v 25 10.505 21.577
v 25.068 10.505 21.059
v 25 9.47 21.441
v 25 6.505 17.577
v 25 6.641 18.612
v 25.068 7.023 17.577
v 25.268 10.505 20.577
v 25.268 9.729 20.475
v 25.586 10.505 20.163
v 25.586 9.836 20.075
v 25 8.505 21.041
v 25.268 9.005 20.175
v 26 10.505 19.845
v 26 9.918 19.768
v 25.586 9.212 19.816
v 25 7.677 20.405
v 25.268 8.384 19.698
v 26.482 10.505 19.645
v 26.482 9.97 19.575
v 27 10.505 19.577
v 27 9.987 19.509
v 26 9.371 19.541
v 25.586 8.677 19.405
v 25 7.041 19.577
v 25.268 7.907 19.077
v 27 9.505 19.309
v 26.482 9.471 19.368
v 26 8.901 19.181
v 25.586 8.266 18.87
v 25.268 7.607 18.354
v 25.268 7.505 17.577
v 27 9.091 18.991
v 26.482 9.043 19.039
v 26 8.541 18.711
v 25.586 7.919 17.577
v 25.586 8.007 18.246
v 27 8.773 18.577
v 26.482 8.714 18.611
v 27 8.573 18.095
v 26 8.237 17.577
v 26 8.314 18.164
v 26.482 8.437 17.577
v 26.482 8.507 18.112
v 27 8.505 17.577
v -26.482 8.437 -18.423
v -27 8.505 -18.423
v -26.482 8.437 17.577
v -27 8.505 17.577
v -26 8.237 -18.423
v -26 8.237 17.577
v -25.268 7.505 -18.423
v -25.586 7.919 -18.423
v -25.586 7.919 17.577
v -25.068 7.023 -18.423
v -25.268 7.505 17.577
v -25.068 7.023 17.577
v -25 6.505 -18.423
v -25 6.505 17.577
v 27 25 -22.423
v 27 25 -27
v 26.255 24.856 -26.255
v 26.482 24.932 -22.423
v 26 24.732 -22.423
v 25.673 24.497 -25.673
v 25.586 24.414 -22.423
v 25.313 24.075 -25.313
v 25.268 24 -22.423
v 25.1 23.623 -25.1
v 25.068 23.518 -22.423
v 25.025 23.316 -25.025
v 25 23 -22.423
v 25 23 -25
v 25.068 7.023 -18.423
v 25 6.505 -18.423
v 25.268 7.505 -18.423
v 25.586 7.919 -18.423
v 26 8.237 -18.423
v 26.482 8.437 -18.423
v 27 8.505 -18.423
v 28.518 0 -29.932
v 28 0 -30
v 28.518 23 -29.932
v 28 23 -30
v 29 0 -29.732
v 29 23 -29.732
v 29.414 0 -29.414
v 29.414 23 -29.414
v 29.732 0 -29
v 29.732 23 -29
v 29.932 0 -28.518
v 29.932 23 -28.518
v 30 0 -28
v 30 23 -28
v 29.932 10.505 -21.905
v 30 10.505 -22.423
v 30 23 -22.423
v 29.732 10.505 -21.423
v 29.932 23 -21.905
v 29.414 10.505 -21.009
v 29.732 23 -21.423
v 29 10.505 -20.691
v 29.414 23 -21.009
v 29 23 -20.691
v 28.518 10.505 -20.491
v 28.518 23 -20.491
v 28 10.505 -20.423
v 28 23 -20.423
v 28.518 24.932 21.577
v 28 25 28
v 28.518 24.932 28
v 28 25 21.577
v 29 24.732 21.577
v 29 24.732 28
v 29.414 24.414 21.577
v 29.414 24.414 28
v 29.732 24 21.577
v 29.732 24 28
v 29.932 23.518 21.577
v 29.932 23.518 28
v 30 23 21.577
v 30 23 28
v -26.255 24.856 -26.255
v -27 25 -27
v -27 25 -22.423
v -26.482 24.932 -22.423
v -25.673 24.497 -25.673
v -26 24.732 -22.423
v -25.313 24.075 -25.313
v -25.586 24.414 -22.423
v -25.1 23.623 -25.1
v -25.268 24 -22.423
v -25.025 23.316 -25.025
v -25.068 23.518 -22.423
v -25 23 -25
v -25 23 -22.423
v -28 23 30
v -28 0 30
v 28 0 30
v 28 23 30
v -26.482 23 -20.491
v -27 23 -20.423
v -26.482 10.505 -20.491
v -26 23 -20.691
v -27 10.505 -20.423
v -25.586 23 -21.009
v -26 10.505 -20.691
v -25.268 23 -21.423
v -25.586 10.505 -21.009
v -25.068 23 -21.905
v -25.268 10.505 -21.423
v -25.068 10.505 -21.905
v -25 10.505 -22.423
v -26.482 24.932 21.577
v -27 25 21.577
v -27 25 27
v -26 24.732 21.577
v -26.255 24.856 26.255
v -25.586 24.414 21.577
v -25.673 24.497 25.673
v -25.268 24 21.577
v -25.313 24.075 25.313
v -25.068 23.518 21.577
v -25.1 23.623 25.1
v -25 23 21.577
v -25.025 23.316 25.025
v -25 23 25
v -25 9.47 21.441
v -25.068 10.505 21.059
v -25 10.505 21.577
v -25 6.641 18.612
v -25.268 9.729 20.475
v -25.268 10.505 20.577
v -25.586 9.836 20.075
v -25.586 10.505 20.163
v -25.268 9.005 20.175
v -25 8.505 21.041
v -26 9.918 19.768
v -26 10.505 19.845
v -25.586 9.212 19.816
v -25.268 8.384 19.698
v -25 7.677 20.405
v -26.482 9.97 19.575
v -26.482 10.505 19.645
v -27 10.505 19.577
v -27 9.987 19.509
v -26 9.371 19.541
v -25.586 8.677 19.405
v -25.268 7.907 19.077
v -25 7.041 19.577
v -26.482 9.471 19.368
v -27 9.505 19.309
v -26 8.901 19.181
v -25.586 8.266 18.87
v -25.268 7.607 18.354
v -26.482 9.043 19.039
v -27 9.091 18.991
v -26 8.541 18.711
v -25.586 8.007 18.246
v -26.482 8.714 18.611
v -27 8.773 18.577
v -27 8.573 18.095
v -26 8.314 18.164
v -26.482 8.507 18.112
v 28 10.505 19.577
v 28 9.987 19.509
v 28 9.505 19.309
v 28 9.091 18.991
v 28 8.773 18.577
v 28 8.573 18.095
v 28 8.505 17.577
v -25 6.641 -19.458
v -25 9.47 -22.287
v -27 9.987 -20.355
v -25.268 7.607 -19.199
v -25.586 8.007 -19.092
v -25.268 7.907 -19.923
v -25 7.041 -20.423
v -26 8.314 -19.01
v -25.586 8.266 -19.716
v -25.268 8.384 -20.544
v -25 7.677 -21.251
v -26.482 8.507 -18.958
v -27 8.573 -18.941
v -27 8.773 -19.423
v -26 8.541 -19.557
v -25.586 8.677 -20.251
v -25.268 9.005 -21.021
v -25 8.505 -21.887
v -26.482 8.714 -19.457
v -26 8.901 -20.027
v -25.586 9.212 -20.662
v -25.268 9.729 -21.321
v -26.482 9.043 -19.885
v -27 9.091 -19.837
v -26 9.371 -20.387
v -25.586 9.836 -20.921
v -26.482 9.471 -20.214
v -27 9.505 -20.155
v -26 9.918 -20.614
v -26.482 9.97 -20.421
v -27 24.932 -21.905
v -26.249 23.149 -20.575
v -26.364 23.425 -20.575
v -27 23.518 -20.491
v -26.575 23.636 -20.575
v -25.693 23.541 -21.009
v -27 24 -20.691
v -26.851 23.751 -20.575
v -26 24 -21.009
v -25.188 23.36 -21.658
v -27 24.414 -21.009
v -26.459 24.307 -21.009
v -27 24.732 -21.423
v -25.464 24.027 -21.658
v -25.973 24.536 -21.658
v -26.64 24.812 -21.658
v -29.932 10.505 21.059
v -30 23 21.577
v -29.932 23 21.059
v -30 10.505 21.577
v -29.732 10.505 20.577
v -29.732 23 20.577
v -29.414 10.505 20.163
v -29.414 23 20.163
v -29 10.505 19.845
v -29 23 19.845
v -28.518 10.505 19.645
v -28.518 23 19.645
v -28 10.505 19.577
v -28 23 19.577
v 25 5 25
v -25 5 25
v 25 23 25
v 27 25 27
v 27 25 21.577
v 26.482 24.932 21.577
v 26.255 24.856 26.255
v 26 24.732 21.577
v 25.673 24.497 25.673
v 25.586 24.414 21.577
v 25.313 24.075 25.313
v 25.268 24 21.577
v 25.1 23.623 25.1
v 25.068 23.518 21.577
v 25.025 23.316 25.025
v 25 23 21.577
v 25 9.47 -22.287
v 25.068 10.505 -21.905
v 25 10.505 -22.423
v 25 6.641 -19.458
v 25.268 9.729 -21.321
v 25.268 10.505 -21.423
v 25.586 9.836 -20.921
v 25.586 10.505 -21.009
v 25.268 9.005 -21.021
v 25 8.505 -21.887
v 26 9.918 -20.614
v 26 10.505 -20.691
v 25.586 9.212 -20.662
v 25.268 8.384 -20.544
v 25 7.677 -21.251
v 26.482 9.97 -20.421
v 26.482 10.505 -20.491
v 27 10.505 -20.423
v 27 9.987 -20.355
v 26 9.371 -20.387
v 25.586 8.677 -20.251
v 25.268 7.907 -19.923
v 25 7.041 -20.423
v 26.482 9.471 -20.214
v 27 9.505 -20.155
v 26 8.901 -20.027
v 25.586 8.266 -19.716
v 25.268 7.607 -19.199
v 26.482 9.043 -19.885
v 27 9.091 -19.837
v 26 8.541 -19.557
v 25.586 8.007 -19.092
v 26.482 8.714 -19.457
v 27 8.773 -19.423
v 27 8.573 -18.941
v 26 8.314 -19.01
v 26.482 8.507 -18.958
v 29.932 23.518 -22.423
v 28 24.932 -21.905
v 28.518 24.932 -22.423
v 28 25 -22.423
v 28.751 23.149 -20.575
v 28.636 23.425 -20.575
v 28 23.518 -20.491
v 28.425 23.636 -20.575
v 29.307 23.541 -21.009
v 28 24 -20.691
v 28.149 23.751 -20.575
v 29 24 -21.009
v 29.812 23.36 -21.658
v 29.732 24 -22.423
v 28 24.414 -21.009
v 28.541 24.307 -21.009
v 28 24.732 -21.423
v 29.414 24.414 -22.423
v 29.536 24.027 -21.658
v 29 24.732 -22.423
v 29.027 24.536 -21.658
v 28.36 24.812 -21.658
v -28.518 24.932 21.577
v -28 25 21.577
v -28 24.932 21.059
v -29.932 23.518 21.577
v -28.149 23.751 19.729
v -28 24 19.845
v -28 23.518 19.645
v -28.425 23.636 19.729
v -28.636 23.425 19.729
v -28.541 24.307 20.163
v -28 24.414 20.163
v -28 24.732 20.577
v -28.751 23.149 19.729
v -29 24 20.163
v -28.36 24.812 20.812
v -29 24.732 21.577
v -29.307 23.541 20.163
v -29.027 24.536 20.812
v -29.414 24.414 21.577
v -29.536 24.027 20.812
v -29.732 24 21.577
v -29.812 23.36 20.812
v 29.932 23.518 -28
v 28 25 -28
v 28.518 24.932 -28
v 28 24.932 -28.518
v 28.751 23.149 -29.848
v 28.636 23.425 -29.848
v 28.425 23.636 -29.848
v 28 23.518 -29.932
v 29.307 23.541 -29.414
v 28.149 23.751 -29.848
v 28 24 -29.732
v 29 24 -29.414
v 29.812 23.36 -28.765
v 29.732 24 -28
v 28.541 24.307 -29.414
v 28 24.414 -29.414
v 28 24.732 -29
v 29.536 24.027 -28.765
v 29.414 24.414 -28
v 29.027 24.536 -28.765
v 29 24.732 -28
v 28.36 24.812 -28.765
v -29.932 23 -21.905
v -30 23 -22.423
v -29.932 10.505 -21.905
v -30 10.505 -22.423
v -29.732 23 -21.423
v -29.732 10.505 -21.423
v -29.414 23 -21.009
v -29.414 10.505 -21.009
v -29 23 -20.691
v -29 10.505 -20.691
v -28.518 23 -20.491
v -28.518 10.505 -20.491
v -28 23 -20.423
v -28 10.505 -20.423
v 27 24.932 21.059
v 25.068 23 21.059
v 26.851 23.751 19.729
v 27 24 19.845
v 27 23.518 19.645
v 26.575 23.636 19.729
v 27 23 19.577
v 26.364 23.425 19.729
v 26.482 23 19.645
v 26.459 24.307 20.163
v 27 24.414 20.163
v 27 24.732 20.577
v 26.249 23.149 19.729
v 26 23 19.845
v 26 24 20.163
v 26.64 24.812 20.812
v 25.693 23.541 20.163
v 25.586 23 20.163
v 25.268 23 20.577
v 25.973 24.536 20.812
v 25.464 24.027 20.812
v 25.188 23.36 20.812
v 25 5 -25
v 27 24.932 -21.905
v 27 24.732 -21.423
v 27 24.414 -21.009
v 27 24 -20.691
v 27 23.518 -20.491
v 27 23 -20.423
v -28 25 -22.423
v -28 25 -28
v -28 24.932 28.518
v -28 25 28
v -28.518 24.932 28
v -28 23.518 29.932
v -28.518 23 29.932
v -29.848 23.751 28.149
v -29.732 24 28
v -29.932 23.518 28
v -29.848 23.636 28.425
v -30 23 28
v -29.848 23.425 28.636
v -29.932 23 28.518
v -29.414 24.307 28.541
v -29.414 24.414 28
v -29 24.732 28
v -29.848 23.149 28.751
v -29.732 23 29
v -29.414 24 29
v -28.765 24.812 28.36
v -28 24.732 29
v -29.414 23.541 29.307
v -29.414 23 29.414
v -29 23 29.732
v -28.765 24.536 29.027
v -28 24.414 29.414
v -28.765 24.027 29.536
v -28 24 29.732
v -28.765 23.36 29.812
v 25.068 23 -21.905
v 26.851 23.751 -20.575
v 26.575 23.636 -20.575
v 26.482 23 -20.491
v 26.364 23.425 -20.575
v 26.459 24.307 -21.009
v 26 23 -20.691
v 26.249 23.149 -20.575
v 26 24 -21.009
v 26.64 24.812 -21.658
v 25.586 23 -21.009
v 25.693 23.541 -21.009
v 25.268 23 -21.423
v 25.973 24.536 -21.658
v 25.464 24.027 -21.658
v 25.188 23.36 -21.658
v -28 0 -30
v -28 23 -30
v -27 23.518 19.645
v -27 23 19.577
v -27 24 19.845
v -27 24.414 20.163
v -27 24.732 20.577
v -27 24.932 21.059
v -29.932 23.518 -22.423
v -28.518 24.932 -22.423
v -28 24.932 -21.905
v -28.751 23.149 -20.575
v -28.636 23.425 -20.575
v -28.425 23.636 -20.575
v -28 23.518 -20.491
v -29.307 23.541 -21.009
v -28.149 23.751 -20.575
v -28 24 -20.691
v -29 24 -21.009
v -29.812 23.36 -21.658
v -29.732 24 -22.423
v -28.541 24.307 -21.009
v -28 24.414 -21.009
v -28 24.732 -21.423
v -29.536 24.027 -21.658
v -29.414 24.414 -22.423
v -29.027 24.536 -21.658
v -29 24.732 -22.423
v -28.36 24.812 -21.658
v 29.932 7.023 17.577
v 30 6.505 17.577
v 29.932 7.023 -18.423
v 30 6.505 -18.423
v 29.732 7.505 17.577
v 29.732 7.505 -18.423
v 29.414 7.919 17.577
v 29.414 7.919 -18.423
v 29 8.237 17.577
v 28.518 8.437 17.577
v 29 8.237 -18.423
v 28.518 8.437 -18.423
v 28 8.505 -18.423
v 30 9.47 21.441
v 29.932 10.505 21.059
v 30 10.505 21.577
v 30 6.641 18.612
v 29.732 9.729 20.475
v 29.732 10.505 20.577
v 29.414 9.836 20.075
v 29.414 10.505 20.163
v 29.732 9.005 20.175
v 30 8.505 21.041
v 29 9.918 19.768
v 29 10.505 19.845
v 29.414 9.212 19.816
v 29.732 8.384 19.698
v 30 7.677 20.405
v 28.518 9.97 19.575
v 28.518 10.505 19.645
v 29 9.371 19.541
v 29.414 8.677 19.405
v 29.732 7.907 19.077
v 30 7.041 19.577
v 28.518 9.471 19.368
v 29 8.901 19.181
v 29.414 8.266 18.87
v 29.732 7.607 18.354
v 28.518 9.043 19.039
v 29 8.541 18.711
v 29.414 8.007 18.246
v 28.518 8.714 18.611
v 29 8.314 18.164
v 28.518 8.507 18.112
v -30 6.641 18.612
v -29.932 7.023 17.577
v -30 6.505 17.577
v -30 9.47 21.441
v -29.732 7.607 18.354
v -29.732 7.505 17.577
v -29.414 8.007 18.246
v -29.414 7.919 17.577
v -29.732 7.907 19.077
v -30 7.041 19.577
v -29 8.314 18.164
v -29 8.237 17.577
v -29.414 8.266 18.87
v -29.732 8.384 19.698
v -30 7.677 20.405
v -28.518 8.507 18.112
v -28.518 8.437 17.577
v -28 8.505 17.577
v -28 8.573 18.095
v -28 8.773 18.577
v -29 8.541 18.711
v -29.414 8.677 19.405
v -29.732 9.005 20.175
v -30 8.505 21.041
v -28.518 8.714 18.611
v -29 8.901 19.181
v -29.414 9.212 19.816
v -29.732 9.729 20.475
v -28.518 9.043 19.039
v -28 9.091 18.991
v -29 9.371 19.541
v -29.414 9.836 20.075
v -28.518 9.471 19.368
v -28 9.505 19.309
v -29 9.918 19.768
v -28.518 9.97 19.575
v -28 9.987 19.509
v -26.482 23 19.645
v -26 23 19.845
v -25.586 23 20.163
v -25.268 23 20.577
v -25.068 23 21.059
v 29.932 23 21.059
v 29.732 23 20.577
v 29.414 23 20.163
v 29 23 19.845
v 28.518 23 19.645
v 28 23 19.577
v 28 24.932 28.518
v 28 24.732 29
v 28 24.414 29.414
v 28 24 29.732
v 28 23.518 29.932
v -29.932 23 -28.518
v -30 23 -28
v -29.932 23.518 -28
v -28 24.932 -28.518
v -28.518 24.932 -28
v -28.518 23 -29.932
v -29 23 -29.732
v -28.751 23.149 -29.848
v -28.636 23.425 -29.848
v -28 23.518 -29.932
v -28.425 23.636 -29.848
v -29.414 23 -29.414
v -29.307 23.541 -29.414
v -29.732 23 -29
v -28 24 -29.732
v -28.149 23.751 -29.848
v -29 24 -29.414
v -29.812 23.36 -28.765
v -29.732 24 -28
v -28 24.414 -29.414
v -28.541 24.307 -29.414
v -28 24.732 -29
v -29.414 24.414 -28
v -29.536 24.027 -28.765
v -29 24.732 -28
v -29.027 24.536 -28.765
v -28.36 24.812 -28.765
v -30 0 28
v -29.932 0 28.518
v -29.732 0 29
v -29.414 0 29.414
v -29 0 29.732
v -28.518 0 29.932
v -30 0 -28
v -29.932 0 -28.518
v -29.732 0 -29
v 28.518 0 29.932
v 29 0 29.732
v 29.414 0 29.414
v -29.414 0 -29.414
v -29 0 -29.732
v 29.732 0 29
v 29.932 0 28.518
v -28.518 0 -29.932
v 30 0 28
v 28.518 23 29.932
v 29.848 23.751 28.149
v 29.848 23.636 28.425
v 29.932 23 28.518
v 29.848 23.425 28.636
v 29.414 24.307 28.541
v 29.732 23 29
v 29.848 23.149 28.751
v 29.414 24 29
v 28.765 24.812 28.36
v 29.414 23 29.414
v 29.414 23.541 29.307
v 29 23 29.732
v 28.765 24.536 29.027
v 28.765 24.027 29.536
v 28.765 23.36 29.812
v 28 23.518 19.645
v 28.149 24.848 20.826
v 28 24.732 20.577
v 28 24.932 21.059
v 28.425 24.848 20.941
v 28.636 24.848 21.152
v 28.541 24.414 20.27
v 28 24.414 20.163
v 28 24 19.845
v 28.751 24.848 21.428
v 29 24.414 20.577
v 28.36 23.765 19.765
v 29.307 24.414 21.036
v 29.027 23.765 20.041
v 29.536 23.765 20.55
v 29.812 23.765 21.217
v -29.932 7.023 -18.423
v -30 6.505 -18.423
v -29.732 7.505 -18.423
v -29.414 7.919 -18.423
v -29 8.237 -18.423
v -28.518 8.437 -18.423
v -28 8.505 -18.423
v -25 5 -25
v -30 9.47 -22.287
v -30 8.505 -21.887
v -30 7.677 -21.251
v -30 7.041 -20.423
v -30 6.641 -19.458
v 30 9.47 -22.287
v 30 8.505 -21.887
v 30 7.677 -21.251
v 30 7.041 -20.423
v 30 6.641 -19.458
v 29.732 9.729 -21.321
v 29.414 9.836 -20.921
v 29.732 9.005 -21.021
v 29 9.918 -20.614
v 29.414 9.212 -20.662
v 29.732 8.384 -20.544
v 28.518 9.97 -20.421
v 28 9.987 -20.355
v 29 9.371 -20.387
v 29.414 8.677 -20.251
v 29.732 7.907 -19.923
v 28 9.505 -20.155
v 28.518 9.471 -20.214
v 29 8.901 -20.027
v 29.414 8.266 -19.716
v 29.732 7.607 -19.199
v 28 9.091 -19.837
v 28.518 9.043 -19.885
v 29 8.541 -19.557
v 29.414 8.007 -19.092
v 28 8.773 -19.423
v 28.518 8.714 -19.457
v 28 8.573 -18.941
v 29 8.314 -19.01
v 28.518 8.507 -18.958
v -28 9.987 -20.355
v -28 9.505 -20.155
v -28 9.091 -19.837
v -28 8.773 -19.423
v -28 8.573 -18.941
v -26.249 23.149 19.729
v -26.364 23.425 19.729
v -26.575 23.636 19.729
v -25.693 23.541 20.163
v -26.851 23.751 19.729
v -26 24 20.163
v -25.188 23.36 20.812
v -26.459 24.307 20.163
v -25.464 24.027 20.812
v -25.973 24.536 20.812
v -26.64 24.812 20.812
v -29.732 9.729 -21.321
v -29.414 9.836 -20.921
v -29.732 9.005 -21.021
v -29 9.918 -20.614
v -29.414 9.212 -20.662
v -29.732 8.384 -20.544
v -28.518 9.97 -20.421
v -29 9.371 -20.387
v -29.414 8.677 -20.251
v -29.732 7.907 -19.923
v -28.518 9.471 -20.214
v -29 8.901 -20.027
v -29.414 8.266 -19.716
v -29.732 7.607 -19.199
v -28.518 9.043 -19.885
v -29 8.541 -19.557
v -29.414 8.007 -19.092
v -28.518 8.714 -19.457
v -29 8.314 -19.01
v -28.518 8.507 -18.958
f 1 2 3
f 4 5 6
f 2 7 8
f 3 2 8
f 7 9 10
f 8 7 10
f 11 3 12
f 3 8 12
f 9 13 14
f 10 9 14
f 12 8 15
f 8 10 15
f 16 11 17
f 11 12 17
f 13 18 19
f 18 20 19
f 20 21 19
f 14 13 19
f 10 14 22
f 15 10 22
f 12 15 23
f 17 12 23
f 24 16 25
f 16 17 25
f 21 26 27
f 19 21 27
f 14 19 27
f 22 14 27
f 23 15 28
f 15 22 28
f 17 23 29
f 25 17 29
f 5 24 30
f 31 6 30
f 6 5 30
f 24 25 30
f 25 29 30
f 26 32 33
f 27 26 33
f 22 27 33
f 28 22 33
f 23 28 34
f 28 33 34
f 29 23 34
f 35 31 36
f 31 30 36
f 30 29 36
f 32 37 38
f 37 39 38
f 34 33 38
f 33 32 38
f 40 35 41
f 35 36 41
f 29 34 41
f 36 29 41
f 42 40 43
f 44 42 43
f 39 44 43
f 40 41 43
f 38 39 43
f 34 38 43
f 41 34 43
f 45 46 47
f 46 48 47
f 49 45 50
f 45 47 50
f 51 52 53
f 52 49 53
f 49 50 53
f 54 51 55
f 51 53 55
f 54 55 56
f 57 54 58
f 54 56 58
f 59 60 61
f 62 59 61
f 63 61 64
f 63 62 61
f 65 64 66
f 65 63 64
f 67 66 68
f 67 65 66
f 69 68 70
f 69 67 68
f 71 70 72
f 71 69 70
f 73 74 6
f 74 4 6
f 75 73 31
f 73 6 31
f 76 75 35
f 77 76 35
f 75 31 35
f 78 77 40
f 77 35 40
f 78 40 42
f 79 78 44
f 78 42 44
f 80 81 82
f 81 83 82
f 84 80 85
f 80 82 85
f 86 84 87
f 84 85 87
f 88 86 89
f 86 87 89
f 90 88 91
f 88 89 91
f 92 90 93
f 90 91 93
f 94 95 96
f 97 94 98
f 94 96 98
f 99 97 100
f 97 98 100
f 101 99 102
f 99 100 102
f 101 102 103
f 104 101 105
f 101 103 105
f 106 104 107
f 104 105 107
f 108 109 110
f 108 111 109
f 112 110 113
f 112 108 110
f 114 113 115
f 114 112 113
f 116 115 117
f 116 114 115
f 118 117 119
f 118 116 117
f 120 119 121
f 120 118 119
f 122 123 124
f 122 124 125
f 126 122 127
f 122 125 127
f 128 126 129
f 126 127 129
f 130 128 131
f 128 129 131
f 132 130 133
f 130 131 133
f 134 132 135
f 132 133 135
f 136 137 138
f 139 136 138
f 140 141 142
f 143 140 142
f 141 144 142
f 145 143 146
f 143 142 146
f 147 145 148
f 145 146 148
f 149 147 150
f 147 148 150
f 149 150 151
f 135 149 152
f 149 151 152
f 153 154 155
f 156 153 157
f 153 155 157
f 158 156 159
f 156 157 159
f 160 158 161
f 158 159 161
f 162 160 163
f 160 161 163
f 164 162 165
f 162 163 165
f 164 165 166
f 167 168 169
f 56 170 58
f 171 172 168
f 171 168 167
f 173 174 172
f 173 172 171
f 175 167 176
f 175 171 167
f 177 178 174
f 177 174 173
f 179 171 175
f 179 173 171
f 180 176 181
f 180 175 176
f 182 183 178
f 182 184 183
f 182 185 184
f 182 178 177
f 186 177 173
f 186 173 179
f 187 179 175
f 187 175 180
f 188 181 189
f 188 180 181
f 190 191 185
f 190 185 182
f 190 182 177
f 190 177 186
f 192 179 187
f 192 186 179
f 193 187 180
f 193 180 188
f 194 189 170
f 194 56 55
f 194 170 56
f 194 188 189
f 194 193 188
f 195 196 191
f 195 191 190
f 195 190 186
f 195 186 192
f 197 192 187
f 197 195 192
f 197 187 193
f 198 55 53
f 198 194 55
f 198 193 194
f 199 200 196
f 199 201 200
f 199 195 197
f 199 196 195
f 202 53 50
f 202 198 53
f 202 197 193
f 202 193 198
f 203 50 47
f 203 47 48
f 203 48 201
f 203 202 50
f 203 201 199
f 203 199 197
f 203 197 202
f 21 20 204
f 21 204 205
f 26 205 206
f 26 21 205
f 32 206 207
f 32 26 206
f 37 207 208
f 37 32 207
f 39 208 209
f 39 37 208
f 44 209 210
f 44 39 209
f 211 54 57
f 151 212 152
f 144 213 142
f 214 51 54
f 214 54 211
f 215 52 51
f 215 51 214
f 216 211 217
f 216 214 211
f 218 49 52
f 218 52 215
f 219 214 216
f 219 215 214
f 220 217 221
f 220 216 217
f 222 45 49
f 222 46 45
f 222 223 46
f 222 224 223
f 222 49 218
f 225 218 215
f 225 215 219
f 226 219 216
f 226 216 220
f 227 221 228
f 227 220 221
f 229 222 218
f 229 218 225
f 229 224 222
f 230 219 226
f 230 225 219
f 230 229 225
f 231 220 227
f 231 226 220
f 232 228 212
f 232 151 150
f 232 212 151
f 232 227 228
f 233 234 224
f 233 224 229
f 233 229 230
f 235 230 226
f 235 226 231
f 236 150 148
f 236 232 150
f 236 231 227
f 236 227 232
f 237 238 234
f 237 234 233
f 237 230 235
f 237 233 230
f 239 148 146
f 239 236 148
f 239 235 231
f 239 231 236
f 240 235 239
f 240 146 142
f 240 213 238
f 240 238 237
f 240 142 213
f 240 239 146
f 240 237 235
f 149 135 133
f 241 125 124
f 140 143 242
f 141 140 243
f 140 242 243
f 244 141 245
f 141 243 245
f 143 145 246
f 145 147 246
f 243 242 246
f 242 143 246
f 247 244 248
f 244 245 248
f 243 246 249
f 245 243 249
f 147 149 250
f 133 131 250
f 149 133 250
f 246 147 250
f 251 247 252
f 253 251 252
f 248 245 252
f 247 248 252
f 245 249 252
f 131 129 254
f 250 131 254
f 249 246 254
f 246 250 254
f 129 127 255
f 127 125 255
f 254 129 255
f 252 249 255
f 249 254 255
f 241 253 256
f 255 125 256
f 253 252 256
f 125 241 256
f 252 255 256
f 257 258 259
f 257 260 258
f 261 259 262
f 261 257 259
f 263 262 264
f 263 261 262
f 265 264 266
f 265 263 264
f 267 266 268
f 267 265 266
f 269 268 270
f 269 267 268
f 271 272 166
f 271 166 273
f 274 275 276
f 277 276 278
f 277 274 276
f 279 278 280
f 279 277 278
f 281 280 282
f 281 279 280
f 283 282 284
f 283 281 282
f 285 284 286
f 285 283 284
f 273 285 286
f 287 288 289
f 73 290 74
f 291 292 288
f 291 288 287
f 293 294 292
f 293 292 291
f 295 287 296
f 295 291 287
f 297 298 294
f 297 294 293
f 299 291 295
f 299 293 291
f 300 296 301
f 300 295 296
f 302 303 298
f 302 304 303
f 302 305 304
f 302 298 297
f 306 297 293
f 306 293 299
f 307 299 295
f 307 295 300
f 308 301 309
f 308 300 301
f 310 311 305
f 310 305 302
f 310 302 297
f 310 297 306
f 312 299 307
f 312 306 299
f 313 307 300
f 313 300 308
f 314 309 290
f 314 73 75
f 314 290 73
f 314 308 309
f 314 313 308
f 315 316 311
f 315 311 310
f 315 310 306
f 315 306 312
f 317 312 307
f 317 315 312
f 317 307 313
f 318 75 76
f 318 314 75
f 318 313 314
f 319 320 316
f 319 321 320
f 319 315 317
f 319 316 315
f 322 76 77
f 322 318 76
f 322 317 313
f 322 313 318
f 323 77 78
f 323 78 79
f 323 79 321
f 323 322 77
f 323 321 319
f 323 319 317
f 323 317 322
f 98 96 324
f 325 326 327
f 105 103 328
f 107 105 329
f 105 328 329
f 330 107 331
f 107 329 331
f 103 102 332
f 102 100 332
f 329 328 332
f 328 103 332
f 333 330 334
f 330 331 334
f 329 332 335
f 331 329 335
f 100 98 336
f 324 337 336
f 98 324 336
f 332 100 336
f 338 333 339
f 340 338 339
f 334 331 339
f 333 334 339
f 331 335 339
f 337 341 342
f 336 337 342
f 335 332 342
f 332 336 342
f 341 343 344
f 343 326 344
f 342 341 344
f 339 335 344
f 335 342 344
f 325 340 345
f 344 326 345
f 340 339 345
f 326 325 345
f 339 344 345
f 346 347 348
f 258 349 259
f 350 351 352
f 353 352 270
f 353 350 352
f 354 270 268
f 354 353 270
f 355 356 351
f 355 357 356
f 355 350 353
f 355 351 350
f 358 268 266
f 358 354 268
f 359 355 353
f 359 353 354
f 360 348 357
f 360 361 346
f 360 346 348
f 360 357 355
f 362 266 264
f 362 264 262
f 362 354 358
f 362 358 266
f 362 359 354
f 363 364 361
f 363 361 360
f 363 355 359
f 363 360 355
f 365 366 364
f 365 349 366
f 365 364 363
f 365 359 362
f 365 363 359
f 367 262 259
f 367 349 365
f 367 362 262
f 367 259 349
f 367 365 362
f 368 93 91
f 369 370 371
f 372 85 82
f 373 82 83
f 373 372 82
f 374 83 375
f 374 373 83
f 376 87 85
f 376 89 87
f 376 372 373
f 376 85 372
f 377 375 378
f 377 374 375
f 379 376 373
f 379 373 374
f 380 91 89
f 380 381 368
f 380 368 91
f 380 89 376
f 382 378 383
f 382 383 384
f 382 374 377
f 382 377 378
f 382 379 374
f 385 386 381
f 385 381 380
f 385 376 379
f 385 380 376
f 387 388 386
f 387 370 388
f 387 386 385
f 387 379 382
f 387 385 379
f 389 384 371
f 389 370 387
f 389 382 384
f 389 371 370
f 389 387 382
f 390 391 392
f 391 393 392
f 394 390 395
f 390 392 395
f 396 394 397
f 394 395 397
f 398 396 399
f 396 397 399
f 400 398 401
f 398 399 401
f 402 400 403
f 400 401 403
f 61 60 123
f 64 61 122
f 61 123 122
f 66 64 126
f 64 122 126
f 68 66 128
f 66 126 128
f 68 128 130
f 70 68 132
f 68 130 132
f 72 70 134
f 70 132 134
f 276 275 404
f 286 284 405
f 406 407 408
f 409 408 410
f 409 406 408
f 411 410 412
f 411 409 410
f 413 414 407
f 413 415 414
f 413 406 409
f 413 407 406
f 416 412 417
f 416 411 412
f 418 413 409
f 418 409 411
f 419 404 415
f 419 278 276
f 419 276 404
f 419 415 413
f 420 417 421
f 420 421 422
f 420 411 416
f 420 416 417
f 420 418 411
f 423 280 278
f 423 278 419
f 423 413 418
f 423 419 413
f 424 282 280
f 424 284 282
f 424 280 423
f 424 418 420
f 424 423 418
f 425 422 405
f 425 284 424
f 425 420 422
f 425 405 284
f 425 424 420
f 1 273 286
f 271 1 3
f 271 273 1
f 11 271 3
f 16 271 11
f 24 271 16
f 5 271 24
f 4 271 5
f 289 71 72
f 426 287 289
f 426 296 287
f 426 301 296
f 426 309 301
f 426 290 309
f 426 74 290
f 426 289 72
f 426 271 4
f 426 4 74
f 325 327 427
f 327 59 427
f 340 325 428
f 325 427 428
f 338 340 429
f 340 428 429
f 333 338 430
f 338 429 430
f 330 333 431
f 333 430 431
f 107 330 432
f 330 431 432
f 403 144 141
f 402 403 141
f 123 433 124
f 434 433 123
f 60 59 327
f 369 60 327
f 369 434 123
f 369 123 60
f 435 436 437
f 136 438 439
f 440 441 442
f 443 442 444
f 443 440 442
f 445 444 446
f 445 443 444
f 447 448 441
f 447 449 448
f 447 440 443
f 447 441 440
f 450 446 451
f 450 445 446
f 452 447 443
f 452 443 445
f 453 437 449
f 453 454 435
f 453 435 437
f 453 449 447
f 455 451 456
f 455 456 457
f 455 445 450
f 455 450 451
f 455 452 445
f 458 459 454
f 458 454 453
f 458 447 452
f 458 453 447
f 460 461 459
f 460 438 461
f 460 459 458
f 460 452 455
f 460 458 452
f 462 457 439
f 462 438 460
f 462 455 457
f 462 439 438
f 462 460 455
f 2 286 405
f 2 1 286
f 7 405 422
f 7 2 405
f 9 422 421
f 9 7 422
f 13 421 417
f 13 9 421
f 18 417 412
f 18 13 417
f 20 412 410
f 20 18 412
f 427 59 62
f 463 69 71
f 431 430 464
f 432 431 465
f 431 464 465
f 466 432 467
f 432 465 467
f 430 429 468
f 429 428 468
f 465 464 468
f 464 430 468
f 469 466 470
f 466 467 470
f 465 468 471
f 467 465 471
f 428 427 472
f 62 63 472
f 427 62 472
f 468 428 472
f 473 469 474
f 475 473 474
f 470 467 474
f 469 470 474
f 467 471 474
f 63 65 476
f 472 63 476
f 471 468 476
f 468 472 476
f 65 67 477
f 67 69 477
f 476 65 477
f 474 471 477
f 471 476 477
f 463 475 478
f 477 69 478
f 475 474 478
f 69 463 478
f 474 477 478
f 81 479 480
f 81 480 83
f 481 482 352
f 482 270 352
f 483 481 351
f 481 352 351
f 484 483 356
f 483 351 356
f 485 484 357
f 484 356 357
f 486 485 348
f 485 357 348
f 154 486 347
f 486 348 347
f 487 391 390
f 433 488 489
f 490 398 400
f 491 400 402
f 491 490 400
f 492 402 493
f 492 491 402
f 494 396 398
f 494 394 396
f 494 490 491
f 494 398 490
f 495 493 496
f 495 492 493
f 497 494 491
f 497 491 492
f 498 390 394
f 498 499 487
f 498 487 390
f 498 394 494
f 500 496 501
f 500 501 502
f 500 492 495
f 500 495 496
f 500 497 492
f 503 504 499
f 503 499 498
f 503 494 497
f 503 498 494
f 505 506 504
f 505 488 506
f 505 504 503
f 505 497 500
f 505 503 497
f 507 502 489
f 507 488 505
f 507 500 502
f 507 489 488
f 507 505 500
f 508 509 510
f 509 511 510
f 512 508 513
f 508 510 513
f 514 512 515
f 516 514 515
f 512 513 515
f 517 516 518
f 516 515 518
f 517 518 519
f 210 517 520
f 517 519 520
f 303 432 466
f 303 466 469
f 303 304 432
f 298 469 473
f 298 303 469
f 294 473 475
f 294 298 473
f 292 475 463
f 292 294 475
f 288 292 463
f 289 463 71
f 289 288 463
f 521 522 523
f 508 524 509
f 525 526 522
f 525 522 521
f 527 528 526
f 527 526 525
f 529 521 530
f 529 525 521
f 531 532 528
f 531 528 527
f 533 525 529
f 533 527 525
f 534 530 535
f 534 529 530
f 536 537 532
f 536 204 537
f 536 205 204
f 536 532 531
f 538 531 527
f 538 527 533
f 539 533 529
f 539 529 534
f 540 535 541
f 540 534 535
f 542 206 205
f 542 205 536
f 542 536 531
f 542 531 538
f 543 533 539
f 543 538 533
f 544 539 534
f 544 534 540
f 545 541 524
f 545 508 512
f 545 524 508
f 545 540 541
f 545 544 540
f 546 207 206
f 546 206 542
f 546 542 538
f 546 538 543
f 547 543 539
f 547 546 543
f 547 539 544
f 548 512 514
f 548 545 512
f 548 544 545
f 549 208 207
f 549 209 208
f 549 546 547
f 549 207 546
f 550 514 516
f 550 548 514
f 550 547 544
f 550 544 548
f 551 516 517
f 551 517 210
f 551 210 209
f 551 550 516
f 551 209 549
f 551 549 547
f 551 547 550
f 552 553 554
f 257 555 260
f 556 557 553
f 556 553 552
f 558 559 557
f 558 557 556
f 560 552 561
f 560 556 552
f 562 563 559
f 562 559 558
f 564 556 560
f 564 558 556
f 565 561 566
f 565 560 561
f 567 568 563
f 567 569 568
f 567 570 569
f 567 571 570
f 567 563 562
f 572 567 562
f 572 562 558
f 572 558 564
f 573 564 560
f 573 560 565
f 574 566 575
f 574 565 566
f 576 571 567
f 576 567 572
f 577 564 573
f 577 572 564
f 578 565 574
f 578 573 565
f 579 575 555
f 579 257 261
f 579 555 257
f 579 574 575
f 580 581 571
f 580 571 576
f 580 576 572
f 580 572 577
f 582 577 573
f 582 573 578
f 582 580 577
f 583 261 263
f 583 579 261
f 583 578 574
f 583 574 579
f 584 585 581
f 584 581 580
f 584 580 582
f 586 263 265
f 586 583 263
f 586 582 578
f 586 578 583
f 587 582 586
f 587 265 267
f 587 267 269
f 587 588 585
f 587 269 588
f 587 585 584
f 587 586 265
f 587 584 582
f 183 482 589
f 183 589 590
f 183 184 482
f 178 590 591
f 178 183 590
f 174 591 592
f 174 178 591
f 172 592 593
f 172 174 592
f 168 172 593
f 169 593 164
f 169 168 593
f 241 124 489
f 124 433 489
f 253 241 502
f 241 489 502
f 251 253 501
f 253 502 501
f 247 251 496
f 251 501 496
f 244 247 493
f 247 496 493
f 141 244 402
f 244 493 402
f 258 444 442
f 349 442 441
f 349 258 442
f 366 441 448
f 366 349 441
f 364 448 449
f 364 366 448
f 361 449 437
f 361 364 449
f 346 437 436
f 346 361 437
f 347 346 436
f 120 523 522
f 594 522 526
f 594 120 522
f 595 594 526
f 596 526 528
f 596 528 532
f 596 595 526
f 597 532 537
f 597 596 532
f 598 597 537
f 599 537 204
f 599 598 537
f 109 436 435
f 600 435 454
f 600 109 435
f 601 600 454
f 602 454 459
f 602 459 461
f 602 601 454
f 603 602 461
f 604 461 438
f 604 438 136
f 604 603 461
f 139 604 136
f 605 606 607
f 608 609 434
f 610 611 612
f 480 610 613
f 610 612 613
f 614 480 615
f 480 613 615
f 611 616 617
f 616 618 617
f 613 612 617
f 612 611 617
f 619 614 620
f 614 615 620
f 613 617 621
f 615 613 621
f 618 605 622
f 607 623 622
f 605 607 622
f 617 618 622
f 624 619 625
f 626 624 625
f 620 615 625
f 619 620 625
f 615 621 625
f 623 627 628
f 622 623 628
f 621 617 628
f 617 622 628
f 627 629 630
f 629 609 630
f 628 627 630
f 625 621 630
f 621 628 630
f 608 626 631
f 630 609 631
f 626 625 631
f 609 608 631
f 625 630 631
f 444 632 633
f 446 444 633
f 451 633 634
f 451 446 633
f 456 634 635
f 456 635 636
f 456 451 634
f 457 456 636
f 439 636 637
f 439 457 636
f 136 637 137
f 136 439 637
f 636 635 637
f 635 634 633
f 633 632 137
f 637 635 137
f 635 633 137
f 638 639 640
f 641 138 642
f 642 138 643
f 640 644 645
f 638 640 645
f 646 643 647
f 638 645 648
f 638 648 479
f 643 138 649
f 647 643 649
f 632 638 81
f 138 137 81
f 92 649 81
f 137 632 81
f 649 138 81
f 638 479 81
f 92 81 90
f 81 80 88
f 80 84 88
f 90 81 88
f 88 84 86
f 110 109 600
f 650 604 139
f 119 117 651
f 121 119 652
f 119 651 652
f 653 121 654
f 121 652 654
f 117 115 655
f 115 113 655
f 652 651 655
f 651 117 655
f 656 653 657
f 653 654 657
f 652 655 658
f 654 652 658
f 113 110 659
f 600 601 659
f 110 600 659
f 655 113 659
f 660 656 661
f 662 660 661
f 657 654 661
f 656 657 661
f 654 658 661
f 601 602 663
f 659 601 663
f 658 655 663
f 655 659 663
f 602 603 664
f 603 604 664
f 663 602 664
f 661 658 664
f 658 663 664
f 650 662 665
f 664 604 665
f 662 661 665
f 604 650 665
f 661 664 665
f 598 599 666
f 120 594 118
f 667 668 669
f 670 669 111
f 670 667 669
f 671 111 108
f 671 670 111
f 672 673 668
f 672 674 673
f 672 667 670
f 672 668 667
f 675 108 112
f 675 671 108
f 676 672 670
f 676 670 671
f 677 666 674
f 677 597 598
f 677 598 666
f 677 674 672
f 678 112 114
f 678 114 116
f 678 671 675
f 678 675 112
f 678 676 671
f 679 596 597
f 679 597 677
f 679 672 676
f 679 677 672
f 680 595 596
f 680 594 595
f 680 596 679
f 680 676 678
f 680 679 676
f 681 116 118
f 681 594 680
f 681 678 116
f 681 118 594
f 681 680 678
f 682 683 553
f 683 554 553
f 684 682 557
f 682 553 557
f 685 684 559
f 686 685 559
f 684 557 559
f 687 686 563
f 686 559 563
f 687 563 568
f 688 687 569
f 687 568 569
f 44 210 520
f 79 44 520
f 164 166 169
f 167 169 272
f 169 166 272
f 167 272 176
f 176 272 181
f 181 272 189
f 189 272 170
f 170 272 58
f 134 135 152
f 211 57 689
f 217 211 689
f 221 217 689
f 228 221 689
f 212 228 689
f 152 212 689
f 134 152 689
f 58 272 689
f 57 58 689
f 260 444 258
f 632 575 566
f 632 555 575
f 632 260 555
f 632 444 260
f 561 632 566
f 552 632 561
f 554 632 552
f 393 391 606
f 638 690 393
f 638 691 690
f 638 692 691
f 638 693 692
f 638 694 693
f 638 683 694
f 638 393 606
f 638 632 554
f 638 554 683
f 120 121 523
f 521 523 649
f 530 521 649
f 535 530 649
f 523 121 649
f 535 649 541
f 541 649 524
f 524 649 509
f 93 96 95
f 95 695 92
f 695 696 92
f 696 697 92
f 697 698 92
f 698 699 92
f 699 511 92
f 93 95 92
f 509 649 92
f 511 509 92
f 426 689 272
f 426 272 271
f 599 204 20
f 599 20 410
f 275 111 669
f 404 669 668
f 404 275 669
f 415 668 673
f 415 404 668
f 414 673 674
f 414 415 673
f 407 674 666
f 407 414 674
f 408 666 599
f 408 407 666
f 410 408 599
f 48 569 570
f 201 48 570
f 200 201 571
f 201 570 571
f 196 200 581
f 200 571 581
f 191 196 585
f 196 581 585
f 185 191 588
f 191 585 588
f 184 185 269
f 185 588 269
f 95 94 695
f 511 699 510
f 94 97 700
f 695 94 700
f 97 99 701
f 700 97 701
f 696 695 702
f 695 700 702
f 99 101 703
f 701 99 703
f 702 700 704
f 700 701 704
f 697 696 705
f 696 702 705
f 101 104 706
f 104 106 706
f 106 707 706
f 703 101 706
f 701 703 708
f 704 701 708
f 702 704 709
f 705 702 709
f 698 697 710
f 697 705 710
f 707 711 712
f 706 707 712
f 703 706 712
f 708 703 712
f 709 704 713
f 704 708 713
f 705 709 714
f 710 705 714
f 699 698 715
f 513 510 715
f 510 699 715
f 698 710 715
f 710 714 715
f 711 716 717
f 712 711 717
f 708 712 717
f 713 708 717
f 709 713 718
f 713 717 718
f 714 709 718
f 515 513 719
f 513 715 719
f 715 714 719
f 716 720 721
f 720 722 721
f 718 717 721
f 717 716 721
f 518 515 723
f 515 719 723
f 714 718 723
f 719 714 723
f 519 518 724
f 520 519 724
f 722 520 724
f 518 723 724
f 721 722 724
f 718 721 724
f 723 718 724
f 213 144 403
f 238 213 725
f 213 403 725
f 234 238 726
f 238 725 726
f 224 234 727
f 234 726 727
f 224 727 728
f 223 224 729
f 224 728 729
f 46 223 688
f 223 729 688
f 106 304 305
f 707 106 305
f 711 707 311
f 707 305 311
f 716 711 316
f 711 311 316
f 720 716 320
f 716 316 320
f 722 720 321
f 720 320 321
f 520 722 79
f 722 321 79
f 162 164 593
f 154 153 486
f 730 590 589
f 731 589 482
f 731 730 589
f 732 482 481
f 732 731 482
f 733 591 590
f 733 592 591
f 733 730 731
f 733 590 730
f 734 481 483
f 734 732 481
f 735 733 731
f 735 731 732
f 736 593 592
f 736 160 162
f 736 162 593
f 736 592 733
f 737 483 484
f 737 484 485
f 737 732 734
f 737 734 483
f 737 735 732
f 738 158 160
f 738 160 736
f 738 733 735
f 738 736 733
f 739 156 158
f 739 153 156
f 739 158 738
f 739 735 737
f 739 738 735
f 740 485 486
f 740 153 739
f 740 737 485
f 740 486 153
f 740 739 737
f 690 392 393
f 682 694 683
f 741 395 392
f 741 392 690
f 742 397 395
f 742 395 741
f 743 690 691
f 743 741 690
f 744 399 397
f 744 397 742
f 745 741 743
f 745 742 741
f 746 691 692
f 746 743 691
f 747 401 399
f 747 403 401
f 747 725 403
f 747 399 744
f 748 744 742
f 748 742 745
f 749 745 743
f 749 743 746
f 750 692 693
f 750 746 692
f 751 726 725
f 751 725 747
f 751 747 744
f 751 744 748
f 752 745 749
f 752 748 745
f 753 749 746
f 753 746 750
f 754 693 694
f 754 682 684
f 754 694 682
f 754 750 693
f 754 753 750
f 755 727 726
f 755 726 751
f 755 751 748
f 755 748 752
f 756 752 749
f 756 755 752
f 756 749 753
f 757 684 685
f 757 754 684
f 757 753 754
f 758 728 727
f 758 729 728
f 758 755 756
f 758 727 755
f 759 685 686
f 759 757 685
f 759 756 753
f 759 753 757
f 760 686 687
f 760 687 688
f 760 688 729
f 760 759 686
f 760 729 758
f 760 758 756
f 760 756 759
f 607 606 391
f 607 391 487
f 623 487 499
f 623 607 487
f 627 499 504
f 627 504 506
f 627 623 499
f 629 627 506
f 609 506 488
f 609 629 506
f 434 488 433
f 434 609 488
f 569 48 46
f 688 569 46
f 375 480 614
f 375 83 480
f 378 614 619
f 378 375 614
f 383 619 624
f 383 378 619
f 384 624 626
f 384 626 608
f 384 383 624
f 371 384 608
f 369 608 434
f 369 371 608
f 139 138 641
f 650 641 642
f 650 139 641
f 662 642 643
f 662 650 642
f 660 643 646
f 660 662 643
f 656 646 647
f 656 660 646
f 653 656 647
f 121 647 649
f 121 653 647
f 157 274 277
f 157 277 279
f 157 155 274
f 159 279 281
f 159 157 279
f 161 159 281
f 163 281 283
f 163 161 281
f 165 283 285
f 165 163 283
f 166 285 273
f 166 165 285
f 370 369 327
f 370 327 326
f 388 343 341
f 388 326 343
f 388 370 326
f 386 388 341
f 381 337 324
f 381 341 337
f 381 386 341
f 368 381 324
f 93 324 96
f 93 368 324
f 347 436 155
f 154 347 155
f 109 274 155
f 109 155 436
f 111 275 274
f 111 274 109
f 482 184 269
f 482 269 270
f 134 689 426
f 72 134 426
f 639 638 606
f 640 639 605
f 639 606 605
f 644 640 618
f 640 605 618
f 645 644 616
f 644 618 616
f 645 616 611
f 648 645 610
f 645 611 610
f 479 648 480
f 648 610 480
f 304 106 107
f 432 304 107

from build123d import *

# Parameters (mm, degrees)
SKETCH5_W           = 60
SKETCH5_H           = 60
BOSS_EXTRUDE3_DEPTH = 25
SHELL1_T            = -5
SKETCH6_W           = 40
SKETCH6_H           = 50
CUT_EXTRUDE2_DEPTH  = 100
FILLET2_R           = 2


with BuildPart() as part:
    # Sketch5 → Boss-Extrude3 (new body)
    with BuildSketch(Plane(origin=(0, 0, 0), x_dir=(1, 0, 0), z_dir=(0, 1, 0))):
        Rectangle(SKETCH5_W, SKETCH5_H)
    extrude(amount=BOSS_EXTRUDE3_DEPTH)

    # Shell1
    shell1_openings = [part.faces().sort_by_distance(p)[0] for p in [
        (0, 25, 0),
    ]]
    offset(amount=SHELL1_T, openings=shell1_openings, kind=Kind.INTERSECTION)

    # Sketch6 → Cut-Extrude2 (cut)
    with BuildSketch(Plane(origin=(30, 0, 0), x_dir=(0, 0, -1), z_dir=(1, 0, 0))):
        with Locations((0.42294972, 33.504960927)):
            Rectangle(SKETCH6_W, SKETCH6_H)
    extrude(amount=-CUT_EXTRUDE2_DEPTH, mode=Mode.SUBTRACT)

    # Fillet2
    fillet2_edges = [part.edges().sort_by_distance(p)[0] for p in [
        (-30, 25, -25.21147486),
        (25, 25, 22.28852514),
        (0, 25, -25),
        (-25, 25, -22.71147486),
        (0, 25, 30),
        (0, 25, 25),
        (-25, 25, 22.28852514),
        (-25, 16.752480464, 19.57705028),
        (-25, 8.504960927, -0.42294972),
        (-25, 16.752480464, -20.42294972),
        (25, 25, -22.71147486),
        (-30, 25, 24.78852514),
        (30, 25, -25.21147486),
        (30, 16.752480464, -20.42294972),
        (30, 16.752480464, 19.57705028),
        (30, 8.504960927, -0.42294972),
        (27.5, 25, -20.42294972),
        (-30, 16.752480464, -20.42294972),
        (-27.5, 25, -20.42294972),
        (-30, 8.504960927, -0.42294972),
        (-27.5, 8.504960927, -20.42294972),
        (25, 8.504960927, -0.42294972),
        (27.5, 8.504960927, -20.42294972),
        (27.5, 25, 19.57705028),
        (27.5, 8.504960927, 19.57705028),
        (-27.5, 25, 19.57705028),
        (-30, 16.752480464, 19.57705028),
        (-27.5, 8.504960927, 19.57705028),
        (25, 16.752480464, -20.42294972),
        (25, 16.752480464, 19.57705028),
        (30, 25, 24.78852514),
        (30, 12.5, 30),
        (-30, 12.5, 30),
        (-30, 12.5, -30),
        (30, 12.5, -30),
        (0, 25, -30),
    ]]
    fillet(fillet2_edges, radius=FILLET2_R)


solid = part.part
